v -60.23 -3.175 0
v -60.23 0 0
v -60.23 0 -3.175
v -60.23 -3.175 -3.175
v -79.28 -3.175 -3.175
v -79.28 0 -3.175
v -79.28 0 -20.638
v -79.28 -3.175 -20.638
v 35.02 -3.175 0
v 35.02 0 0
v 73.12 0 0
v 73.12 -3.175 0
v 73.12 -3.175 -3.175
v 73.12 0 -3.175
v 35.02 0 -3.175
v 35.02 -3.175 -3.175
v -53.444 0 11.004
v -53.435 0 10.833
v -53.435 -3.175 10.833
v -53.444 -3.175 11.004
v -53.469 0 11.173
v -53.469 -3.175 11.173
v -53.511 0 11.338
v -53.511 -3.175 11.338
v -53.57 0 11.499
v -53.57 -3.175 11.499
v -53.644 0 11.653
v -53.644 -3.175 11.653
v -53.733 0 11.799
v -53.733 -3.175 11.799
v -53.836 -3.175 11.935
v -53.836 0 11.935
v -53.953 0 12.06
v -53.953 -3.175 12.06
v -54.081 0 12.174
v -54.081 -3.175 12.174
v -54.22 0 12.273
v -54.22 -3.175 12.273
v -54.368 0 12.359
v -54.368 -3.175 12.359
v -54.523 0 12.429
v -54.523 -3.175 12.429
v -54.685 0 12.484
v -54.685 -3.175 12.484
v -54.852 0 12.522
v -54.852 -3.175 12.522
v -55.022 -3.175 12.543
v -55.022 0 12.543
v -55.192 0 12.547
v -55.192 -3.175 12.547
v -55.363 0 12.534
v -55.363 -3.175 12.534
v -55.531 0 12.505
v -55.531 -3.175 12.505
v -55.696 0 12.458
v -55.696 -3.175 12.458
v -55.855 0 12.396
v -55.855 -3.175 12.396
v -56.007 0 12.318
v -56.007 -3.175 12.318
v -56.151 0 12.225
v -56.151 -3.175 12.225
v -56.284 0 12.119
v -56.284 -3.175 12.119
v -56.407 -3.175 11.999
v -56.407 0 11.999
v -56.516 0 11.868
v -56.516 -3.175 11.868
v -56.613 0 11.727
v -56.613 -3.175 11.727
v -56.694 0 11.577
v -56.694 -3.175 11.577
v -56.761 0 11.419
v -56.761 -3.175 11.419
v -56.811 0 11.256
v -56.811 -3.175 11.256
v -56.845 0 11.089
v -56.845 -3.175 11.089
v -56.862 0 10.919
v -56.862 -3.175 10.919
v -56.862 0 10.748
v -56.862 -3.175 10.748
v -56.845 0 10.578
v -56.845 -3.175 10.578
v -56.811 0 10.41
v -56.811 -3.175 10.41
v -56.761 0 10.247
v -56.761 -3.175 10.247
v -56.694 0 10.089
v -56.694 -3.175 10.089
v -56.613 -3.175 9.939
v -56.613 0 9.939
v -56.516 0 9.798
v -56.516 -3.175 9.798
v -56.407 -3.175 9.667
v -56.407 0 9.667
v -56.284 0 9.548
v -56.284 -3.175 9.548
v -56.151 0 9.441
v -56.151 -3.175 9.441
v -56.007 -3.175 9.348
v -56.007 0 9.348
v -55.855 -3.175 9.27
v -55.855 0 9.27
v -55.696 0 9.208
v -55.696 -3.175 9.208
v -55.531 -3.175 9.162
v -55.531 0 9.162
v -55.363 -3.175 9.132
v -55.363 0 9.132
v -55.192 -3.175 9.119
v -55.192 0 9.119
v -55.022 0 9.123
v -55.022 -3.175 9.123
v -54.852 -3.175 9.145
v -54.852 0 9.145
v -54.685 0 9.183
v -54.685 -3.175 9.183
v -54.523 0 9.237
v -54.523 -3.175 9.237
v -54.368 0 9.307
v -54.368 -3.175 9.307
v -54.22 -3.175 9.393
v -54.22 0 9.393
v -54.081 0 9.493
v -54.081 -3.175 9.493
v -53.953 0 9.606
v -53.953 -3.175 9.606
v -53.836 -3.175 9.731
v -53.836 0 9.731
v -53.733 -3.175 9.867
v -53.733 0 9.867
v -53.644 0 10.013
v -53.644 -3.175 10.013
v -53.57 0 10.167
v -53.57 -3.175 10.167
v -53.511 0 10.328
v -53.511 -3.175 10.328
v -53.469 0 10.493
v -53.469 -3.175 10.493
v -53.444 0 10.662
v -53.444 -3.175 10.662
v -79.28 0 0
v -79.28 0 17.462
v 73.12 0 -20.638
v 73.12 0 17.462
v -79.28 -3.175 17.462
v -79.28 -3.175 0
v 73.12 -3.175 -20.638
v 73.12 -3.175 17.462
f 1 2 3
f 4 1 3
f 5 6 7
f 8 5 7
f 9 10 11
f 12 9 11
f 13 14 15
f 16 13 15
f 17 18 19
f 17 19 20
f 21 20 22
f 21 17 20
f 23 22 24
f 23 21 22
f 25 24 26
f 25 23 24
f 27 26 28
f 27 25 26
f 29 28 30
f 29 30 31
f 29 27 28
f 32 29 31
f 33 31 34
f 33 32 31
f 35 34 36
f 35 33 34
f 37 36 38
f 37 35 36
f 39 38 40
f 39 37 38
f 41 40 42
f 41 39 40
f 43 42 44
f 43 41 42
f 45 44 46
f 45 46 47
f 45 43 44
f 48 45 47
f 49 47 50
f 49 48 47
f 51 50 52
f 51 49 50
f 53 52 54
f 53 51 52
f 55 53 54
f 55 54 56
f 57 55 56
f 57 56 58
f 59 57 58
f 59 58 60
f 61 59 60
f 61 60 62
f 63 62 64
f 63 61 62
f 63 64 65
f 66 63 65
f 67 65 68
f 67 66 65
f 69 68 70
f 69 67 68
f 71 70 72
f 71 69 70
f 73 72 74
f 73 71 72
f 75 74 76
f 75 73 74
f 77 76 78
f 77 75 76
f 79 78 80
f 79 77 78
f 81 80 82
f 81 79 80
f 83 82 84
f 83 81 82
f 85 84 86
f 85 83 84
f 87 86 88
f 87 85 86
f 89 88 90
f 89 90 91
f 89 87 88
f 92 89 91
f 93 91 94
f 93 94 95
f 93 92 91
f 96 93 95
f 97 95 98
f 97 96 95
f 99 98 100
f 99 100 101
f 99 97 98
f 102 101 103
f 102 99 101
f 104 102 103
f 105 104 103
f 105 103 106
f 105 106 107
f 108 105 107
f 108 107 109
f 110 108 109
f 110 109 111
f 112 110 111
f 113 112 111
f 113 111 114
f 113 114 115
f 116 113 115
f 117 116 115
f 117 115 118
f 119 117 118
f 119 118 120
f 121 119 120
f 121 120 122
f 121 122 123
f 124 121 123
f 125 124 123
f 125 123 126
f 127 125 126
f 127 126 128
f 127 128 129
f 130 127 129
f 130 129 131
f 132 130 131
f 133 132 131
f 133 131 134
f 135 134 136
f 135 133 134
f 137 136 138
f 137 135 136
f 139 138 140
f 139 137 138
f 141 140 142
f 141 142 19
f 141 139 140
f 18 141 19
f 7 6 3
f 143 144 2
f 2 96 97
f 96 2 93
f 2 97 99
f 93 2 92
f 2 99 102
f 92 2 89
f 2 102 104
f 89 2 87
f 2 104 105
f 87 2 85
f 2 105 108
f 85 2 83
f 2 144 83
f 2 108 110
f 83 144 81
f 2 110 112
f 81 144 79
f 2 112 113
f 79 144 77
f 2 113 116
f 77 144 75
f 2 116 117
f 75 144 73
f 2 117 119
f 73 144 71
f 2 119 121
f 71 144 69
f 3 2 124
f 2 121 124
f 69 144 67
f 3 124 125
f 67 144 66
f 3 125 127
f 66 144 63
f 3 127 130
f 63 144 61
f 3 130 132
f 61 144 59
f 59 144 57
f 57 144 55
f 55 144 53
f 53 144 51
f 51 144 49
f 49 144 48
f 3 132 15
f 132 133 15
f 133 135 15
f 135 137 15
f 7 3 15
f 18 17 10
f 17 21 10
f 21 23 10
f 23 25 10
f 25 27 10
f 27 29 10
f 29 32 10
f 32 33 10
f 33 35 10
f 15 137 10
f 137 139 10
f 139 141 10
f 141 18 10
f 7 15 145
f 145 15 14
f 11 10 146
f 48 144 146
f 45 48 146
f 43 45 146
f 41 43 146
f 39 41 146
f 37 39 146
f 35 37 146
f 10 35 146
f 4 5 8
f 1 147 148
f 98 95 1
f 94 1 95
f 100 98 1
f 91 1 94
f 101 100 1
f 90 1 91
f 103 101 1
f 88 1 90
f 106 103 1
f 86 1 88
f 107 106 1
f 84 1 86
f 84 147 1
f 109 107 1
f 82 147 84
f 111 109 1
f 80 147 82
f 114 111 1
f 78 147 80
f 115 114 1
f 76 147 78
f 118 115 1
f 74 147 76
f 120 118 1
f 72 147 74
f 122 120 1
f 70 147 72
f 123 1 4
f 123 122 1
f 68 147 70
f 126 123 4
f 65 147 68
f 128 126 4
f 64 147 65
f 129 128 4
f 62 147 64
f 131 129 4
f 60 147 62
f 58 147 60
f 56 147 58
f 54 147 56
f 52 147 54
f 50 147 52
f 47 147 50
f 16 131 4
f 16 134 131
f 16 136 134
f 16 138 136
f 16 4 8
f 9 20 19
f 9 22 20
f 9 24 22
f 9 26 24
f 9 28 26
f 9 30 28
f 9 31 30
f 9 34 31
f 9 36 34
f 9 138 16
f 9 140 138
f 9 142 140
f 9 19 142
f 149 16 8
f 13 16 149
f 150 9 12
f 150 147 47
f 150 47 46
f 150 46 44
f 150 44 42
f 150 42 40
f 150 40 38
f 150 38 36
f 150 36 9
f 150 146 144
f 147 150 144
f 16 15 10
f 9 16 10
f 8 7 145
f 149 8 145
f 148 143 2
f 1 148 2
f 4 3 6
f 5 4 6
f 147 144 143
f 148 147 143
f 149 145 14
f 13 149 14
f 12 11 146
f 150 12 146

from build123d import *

# Parameters (mm, degrees)
F0_R     = 1.7145
F1_DEPTH = 3.175


with BuildPart() as f1:
    # F0 (on Front) → F1 (new body)
    with BuildSketch(Plane.XZ):
        Polygon((73.120295, 17.4625), (-79.279705, 17.4625), (-79.279705, 0), (-60.229705, 0), (-60.229705, -1.5875), (35.020295, -1.5875), (35.020295, 0), (47.720295, 0), (73.120295, 0), align=None)
        with Locations((-55.149705, 10.8331)):
            Circle(F0_R, mode=Mode.SUBTRACT)
        Polygon((-60.229705, -3.175), (-79.279705, -3.175), (-79.279705, -20.6375), (73.120295, -20.6375), (73.120295, -3.175), (47.720295, -3.175), (35.020295, -3.175), (35.020295, -1.5875), (-60.229705, -1.5875), align=None)
    extrude(amount=F1_DEPTH)


solid = f1.part
